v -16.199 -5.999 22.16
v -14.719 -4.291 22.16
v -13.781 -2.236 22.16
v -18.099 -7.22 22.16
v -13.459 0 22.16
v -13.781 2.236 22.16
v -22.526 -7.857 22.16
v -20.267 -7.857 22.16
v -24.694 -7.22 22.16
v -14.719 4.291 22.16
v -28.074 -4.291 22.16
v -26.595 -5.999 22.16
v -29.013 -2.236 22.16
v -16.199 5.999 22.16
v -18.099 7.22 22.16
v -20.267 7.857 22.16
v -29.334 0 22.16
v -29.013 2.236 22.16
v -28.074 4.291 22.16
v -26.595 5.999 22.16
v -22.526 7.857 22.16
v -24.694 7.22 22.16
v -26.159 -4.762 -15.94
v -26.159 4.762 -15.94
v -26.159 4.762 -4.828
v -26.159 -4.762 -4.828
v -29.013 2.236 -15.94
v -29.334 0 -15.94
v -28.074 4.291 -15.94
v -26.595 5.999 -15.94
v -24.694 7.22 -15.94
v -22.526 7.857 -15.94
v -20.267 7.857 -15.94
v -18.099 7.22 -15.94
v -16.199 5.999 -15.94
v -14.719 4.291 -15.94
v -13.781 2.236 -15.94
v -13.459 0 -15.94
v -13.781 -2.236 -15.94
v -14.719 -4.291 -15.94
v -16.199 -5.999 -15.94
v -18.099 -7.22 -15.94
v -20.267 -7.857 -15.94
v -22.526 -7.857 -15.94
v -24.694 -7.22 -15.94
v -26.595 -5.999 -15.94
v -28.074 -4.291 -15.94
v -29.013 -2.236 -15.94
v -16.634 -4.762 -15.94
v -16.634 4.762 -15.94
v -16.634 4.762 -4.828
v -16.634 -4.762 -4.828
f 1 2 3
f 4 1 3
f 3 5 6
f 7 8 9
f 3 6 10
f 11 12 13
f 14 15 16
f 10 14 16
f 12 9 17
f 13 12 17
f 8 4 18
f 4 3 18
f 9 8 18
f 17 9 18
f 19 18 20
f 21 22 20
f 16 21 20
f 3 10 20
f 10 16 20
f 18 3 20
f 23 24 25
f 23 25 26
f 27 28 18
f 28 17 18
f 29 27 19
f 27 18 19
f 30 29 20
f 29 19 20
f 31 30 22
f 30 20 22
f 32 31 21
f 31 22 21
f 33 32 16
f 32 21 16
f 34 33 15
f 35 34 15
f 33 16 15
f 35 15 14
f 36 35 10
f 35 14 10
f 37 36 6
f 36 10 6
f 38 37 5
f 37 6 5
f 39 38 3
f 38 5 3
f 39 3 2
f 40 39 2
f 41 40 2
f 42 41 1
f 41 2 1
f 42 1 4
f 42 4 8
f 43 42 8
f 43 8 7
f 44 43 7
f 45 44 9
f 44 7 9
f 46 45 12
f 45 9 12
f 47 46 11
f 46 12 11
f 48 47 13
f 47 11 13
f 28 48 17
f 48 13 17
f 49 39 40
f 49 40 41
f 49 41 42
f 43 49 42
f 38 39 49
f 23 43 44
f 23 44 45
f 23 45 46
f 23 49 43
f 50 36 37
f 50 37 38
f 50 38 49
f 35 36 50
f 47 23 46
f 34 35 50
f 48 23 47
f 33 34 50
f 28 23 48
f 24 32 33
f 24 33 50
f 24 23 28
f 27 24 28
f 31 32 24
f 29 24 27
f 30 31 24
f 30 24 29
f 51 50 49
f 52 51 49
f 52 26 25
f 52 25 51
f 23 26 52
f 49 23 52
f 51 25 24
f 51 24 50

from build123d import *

# Parameters (mm, degrees)
F0_W     = 7.9375
F0_H     = 38.1
F2_W     = 9.525
F2_H     = 9.525
F3_DEPTH = 11.1125


with BuildPart() as f1:
    # F0 (on Front) → F1 (revolve)
    with BuildSketch(Plane.XZ):
        with Locations((-25.365302, 3.109904)):
            Rectangle(F0_W, F0_H)
    revolve(axis=Axis((-21.396552, 0, 3.109904), (0, 0, -1)))

    # F2 (on face) → F3 (cut)
    with BuildSketch(Plane(origin=(0, 0, -15.940096), x_dir=(1, 0, 0), z_dir=(0, 0, -1))):
        with Locations((-21.396552, 0)):
            Rectangle(F2_W, F2_H)
    extrude(amount=-F3_DEPTH, mode=Mode.SUBTRACT)


solid = f1.part
